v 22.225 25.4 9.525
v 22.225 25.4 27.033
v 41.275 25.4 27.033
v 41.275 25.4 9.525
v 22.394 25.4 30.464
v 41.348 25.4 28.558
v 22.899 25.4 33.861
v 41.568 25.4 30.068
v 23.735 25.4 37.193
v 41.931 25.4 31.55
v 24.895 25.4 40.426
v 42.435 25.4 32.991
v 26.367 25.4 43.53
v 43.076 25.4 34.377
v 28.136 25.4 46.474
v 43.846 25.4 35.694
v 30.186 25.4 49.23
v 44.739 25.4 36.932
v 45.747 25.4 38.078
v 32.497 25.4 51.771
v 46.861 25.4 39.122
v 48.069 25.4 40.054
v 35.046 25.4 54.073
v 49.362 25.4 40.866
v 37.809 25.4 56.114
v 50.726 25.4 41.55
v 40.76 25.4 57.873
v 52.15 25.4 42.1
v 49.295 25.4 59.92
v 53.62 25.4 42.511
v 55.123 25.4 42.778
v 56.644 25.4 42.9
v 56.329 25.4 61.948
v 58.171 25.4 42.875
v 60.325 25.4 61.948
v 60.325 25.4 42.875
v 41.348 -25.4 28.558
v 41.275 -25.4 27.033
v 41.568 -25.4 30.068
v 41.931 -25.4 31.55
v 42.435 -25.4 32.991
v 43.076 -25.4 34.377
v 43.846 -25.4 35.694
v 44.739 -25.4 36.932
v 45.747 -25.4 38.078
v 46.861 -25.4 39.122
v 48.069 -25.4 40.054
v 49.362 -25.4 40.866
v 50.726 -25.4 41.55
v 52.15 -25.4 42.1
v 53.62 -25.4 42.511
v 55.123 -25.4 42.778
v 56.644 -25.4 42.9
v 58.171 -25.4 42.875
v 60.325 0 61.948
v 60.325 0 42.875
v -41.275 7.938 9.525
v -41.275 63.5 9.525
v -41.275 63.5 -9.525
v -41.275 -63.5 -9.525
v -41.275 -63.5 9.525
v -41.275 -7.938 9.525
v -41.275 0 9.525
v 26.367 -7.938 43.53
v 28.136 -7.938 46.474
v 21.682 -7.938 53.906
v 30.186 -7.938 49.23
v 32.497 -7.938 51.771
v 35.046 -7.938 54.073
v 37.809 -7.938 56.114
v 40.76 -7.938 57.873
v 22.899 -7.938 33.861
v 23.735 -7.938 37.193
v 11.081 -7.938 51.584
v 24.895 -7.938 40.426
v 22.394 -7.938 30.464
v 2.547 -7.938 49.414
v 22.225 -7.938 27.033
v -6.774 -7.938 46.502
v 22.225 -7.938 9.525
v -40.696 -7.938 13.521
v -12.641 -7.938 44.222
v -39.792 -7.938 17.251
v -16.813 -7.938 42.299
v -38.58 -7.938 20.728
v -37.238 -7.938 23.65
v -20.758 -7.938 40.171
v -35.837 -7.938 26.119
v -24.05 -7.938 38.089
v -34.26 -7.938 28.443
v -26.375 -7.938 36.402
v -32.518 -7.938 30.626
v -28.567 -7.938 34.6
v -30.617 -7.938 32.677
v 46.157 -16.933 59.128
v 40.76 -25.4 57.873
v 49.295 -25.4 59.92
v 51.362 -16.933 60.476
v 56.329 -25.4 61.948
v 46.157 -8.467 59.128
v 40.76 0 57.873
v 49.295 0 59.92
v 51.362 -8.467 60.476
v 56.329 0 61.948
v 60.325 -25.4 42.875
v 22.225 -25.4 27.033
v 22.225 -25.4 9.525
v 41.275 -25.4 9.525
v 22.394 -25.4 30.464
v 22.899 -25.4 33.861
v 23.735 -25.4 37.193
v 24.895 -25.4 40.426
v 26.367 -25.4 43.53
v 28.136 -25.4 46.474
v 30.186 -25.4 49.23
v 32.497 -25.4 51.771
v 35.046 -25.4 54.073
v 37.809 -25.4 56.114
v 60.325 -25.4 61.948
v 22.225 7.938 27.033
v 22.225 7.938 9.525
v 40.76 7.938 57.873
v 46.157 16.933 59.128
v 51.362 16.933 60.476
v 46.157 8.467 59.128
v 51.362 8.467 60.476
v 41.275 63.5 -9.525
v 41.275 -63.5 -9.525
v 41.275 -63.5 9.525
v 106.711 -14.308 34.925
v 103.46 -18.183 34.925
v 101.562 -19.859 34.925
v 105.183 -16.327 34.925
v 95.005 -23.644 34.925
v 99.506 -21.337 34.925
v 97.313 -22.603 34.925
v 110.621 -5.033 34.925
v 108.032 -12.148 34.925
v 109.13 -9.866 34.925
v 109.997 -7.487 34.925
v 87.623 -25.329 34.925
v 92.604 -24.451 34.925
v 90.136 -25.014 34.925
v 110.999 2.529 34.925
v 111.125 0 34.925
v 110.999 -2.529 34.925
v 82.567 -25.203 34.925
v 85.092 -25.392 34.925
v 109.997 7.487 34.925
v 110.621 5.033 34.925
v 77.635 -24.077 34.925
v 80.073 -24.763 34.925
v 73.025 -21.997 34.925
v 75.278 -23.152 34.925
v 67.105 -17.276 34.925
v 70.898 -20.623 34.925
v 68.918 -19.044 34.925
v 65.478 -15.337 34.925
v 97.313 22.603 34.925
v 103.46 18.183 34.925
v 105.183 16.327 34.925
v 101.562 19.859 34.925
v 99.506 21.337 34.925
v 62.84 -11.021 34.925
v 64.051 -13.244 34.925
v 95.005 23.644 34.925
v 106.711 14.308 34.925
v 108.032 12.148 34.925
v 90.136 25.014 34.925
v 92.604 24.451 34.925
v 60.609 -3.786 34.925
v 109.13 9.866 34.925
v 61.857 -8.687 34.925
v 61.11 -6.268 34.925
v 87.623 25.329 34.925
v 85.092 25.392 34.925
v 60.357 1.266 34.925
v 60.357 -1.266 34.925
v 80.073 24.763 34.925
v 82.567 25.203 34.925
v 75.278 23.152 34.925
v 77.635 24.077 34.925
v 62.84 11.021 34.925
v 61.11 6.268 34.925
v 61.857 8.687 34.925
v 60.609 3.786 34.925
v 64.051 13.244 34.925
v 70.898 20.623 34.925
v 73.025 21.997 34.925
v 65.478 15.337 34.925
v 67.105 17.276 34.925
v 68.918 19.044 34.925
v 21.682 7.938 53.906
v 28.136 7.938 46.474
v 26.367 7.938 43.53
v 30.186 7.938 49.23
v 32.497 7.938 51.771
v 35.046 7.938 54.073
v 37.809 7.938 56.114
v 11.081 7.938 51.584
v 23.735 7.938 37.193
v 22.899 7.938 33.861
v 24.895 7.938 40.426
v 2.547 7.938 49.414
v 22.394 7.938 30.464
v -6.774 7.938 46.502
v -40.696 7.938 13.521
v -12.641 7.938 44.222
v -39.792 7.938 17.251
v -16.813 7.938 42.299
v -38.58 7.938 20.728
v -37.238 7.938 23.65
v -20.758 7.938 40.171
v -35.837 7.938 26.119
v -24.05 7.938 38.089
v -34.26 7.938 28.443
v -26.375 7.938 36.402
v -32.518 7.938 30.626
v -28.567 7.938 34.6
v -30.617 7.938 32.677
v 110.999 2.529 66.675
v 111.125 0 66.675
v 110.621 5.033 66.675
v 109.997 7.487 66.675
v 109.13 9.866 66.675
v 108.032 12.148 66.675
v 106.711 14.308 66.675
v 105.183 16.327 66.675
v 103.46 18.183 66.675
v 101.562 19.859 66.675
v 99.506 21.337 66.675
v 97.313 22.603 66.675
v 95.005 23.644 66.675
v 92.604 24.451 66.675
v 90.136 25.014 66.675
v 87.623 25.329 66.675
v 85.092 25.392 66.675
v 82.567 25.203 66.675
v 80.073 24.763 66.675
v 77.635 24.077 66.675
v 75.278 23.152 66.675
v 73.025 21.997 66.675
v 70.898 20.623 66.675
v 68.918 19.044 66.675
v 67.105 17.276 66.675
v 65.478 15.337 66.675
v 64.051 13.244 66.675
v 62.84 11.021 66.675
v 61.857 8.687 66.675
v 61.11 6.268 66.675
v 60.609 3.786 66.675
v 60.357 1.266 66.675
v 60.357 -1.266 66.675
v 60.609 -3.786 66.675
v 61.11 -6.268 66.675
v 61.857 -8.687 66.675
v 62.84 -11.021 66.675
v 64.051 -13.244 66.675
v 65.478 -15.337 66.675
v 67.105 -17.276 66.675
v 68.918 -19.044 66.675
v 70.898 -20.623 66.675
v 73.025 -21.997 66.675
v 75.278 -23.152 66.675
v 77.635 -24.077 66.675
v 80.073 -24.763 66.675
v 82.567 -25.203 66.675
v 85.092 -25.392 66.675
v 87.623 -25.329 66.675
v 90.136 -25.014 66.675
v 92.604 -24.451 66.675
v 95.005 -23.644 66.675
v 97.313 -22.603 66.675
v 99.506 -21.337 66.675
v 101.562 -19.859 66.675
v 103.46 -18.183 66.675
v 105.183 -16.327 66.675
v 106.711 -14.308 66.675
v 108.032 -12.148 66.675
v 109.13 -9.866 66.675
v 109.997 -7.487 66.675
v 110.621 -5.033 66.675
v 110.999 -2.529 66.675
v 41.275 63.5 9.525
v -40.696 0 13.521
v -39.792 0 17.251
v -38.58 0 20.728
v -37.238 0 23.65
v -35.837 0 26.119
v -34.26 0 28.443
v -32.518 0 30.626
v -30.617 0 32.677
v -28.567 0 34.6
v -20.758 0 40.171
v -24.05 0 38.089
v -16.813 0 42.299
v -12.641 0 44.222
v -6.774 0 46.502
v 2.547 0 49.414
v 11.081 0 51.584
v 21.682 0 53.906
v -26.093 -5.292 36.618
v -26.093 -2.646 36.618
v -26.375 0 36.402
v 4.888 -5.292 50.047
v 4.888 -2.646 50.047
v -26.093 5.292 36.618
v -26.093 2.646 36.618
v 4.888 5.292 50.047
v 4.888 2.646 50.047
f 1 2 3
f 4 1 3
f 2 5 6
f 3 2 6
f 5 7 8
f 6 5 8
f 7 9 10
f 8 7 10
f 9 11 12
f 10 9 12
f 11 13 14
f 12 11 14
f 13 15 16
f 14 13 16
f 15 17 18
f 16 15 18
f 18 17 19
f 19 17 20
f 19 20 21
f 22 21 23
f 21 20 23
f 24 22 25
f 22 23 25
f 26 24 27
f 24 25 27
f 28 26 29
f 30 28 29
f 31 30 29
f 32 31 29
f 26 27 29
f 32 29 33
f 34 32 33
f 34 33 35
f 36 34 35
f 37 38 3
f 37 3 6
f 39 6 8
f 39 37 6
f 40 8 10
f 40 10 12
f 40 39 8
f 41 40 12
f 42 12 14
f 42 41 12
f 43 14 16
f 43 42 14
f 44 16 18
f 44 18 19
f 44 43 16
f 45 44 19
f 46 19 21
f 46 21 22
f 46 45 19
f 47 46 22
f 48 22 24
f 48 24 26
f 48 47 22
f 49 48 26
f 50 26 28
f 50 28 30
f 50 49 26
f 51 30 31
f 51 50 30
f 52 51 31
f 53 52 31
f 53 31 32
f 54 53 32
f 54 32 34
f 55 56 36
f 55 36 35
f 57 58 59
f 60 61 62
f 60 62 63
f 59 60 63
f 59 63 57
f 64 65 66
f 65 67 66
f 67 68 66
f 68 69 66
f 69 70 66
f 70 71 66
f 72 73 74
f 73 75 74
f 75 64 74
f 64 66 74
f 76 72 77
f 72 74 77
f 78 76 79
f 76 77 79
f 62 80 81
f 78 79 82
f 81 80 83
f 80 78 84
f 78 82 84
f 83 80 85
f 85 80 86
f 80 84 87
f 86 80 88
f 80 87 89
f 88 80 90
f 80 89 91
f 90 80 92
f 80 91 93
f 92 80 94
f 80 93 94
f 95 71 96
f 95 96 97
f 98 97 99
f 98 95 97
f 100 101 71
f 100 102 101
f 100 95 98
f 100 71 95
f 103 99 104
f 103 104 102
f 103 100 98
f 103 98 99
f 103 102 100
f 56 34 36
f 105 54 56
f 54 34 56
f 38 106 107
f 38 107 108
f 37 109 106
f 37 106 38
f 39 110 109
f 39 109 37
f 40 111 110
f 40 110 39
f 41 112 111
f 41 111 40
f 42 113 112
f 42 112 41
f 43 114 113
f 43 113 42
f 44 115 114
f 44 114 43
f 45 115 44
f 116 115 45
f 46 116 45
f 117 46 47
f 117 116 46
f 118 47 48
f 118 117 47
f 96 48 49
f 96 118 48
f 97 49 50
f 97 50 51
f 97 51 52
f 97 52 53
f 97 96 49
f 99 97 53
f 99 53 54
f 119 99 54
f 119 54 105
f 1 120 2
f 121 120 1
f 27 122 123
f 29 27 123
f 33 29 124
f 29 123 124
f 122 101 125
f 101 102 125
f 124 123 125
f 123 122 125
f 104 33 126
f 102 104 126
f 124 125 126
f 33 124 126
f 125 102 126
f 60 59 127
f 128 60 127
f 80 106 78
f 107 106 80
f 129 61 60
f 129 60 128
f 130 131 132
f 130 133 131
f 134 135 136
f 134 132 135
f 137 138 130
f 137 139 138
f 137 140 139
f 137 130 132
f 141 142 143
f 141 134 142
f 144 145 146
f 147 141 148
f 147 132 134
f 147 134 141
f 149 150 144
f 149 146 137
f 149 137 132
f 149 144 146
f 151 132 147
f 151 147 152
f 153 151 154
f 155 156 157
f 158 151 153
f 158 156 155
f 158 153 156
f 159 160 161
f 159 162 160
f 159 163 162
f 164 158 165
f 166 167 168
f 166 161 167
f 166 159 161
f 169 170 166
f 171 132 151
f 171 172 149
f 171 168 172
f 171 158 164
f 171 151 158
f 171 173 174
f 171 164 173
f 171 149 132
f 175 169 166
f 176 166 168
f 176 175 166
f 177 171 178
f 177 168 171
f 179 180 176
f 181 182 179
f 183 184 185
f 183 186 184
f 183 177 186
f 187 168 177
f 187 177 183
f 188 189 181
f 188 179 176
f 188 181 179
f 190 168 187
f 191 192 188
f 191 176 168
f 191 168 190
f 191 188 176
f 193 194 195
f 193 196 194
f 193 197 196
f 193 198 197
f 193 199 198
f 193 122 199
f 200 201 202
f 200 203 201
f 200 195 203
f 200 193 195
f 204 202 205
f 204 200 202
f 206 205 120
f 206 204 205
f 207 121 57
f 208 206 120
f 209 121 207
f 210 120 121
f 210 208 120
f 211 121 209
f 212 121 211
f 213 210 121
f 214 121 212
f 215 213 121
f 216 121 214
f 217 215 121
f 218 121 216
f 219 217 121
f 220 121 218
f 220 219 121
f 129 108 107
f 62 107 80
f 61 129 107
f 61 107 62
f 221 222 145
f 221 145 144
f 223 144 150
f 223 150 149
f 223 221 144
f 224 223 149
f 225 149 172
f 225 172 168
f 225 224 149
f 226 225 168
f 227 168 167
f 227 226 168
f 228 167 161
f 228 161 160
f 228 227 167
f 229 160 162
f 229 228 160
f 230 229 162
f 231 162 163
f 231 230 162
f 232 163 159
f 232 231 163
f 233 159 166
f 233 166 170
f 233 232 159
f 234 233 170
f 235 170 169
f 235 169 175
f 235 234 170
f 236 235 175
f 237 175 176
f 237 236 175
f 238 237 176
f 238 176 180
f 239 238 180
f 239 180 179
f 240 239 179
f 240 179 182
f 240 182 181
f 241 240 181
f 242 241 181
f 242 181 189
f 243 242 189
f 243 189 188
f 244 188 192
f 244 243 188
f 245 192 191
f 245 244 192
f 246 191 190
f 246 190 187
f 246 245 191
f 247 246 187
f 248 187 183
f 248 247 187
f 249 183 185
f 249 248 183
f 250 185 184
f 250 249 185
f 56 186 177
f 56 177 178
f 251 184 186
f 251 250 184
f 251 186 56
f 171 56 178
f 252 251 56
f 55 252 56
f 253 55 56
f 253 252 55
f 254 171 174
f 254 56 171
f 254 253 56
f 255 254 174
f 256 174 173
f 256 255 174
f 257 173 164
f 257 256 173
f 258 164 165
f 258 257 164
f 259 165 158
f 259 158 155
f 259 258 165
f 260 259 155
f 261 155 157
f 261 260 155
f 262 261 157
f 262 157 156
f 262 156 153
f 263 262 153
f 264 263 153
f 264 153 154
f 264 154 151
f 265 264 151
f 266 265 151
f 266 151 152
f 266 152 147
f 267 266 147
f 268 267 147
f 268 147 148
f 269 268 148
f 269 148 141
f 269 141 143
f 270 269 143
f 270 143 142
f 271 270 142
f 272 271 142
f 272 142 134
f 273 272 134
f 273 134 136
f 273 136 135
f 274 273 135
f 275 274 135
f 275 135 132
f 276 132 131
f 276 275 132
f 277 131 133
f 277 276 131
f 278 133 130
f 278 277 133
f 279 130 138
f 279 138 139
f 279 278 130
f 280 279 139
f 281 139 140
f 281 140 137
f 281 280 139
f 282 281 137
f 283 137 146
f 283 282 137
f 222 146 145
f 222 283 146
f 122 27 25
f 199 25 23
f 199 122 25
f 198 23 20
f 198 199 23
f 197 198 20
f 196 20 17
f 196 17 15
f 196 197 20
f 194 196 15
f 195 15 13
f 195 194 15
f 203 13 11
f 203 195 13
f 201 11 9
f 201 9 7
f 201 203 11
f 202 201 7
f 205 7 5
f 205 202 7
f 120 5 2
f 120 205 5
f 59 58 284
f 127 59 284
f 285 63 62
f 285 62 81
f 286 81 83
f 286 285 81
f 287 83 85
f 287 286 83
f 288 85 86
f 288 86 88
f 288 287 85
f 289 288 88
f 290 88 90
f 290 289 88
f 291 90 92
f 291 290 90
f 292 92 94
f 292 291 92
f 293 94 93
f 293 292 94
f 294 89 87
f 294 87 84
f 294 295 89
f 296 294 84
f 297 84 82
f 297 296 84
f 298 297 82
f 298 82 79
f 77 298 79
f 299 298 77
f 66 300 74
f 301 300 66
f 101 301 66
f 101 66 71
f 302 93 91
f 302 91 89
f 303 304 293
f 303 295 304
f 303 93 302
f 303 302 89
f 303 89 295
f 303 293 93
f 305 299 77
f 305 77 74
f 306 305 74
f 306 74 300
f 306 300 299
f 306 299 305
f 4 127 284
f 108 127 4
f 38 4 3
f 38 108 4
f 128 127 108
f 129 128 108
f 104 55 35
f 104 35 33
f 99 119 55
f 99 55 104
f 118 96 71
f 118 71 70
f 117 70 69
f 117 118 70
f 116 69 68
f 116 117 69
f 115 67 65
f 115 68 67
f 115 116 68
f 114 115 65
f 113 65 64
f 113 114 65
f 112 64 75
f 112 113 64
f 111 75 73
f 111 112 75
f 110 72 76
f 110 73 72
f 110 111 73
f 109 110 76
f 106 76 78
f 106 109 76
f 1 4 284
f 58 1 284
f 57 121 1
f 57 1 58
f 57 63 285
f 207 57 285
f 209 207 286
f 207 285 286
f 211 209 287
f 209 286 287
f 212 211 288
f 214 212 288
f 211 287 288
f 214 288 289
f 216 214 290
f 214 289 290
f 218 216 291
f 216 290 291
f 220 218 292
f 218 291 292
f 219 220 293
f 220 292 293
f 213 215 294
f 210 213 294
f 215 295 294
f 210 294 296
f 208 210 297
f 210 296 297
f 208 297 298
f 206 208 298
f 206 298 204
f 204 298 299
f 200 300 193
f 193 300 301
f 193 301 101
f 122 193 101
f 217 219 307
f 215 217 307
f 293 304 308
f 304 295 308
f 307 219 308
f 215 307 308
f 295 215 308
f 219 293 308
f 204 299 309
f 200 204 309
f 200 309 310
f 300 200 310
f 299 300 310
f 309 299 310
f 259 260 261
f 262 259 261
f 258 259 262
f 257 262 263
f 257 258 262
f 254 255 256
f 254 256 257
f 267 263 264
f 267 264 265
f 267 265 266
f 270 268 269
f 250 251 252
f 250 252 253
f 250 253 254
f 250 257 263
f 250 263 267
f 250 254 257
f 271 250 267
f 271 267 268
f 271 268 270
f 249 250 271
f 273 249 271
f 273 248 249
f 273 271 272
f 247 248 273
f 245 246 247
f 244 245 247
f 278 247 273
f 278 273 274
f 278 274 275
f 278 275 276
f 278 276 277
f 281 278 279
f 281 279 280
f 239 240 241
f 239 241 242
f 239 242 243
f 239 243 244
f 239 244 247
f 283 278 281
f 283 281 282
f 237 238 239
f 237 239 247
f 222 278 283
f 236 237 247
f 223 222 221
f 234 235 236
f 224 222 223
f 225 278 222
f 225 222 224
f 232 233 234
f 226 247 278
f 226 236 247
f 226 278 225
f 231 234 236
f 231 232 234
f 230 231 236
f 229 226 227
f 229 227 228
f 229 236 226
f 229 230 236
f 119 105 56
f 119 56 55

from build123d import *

# Parameters (mm, degrees)
F1_DEPTH = 63.5
F2_DEPTH = 25.4
F3_DEPTH = 7.9375


with BuildPart() as f1:
    # F0 (on Front) → F1 (new body, symmetric)
    with BuildSketch(Plane.XZ):
        Polygon((22.225, 9.525), (-41.275, 9.525), (-41.275, -9.525), (41.275, -9.525), (41.275, 9.525), align=None)
    extrude(amount=F1_DEPTH, both=True)

    # F0 (on Front) → F2 (join, symmetric)
    with BuildSketch(Plane.XZ):
        with BuildLine():
            Line((22.225, 27.033037), (22.225, 9.525))
            Line((22.225, 9.525), (41.275, 9.525))
            Line((41.275, 9.525), (41.275, 27.033037))
            ThreePointArc((41.275, 27.033037), (46.291489, 38.613554), (58.170542, 42.8752))
            Line((58.170542, 42.8752), (60.325, 42.8752))
            Line((60.325, 42.8752), (60.325, 61.948398))
            Line((60.325, 61.948398), (56.329497, 61.948398))
            add(Edge.make_bspline(
                [(40.759663, 57.873149), (46.239542, 59.091759), (51.49404, 60.402469), (56.329497, 61.948398)],
                knots=[95.674373, 95.674373, 95.674373, 95.674373, 110.791924, 110.791924, 110.791924, 110.791924], degree=3))
            ThreePointArc((40.759663, 57.873149), (27.21517, 45.023633), (22.225, 27.033037))
        make_face()
    extrude(amount=F2_DEPTH, both=True)

    # F0 (on Front) → F3 (join, symmetric)
    with BuildSketch(Plane.XZ):
        with BuildLine():
            add(Edge.make_bspline(
                [(-41.275, 9.525), (-37.628421, 46.137521), (6.079175, 50.160935), (40.759663, 57.873149)],
                knots=[0, 0, 0, 0, 95.674373, 95.674373, 95.674373, 95.674373], degree=3))
            Line((-41.275, 9.525), (22.225, 9.525))
            Line((22.225, 9.525), (22.225, 27.033037))
            ThreePointArc((22.225, 27.033037), (27.21517, 45.023633), (40.759663, 57.873149))
        make_face()
    extrude(amount=F3_DEPTH, both=True)

    # F0 (on Front) → F4 (revolve)
    with BuildSketch(Plane.XZ):
        Polygon((85.725, 66.675), (85.725, 61.948398), (85.725, 42.8752), (85.725, 34.925), (111.125, 34.925), (111.125, 66.675), align=None)
    revolve(axis=Axis((85.725, 0, 50.8), (0, 0, 1)))


solid = f1.part
